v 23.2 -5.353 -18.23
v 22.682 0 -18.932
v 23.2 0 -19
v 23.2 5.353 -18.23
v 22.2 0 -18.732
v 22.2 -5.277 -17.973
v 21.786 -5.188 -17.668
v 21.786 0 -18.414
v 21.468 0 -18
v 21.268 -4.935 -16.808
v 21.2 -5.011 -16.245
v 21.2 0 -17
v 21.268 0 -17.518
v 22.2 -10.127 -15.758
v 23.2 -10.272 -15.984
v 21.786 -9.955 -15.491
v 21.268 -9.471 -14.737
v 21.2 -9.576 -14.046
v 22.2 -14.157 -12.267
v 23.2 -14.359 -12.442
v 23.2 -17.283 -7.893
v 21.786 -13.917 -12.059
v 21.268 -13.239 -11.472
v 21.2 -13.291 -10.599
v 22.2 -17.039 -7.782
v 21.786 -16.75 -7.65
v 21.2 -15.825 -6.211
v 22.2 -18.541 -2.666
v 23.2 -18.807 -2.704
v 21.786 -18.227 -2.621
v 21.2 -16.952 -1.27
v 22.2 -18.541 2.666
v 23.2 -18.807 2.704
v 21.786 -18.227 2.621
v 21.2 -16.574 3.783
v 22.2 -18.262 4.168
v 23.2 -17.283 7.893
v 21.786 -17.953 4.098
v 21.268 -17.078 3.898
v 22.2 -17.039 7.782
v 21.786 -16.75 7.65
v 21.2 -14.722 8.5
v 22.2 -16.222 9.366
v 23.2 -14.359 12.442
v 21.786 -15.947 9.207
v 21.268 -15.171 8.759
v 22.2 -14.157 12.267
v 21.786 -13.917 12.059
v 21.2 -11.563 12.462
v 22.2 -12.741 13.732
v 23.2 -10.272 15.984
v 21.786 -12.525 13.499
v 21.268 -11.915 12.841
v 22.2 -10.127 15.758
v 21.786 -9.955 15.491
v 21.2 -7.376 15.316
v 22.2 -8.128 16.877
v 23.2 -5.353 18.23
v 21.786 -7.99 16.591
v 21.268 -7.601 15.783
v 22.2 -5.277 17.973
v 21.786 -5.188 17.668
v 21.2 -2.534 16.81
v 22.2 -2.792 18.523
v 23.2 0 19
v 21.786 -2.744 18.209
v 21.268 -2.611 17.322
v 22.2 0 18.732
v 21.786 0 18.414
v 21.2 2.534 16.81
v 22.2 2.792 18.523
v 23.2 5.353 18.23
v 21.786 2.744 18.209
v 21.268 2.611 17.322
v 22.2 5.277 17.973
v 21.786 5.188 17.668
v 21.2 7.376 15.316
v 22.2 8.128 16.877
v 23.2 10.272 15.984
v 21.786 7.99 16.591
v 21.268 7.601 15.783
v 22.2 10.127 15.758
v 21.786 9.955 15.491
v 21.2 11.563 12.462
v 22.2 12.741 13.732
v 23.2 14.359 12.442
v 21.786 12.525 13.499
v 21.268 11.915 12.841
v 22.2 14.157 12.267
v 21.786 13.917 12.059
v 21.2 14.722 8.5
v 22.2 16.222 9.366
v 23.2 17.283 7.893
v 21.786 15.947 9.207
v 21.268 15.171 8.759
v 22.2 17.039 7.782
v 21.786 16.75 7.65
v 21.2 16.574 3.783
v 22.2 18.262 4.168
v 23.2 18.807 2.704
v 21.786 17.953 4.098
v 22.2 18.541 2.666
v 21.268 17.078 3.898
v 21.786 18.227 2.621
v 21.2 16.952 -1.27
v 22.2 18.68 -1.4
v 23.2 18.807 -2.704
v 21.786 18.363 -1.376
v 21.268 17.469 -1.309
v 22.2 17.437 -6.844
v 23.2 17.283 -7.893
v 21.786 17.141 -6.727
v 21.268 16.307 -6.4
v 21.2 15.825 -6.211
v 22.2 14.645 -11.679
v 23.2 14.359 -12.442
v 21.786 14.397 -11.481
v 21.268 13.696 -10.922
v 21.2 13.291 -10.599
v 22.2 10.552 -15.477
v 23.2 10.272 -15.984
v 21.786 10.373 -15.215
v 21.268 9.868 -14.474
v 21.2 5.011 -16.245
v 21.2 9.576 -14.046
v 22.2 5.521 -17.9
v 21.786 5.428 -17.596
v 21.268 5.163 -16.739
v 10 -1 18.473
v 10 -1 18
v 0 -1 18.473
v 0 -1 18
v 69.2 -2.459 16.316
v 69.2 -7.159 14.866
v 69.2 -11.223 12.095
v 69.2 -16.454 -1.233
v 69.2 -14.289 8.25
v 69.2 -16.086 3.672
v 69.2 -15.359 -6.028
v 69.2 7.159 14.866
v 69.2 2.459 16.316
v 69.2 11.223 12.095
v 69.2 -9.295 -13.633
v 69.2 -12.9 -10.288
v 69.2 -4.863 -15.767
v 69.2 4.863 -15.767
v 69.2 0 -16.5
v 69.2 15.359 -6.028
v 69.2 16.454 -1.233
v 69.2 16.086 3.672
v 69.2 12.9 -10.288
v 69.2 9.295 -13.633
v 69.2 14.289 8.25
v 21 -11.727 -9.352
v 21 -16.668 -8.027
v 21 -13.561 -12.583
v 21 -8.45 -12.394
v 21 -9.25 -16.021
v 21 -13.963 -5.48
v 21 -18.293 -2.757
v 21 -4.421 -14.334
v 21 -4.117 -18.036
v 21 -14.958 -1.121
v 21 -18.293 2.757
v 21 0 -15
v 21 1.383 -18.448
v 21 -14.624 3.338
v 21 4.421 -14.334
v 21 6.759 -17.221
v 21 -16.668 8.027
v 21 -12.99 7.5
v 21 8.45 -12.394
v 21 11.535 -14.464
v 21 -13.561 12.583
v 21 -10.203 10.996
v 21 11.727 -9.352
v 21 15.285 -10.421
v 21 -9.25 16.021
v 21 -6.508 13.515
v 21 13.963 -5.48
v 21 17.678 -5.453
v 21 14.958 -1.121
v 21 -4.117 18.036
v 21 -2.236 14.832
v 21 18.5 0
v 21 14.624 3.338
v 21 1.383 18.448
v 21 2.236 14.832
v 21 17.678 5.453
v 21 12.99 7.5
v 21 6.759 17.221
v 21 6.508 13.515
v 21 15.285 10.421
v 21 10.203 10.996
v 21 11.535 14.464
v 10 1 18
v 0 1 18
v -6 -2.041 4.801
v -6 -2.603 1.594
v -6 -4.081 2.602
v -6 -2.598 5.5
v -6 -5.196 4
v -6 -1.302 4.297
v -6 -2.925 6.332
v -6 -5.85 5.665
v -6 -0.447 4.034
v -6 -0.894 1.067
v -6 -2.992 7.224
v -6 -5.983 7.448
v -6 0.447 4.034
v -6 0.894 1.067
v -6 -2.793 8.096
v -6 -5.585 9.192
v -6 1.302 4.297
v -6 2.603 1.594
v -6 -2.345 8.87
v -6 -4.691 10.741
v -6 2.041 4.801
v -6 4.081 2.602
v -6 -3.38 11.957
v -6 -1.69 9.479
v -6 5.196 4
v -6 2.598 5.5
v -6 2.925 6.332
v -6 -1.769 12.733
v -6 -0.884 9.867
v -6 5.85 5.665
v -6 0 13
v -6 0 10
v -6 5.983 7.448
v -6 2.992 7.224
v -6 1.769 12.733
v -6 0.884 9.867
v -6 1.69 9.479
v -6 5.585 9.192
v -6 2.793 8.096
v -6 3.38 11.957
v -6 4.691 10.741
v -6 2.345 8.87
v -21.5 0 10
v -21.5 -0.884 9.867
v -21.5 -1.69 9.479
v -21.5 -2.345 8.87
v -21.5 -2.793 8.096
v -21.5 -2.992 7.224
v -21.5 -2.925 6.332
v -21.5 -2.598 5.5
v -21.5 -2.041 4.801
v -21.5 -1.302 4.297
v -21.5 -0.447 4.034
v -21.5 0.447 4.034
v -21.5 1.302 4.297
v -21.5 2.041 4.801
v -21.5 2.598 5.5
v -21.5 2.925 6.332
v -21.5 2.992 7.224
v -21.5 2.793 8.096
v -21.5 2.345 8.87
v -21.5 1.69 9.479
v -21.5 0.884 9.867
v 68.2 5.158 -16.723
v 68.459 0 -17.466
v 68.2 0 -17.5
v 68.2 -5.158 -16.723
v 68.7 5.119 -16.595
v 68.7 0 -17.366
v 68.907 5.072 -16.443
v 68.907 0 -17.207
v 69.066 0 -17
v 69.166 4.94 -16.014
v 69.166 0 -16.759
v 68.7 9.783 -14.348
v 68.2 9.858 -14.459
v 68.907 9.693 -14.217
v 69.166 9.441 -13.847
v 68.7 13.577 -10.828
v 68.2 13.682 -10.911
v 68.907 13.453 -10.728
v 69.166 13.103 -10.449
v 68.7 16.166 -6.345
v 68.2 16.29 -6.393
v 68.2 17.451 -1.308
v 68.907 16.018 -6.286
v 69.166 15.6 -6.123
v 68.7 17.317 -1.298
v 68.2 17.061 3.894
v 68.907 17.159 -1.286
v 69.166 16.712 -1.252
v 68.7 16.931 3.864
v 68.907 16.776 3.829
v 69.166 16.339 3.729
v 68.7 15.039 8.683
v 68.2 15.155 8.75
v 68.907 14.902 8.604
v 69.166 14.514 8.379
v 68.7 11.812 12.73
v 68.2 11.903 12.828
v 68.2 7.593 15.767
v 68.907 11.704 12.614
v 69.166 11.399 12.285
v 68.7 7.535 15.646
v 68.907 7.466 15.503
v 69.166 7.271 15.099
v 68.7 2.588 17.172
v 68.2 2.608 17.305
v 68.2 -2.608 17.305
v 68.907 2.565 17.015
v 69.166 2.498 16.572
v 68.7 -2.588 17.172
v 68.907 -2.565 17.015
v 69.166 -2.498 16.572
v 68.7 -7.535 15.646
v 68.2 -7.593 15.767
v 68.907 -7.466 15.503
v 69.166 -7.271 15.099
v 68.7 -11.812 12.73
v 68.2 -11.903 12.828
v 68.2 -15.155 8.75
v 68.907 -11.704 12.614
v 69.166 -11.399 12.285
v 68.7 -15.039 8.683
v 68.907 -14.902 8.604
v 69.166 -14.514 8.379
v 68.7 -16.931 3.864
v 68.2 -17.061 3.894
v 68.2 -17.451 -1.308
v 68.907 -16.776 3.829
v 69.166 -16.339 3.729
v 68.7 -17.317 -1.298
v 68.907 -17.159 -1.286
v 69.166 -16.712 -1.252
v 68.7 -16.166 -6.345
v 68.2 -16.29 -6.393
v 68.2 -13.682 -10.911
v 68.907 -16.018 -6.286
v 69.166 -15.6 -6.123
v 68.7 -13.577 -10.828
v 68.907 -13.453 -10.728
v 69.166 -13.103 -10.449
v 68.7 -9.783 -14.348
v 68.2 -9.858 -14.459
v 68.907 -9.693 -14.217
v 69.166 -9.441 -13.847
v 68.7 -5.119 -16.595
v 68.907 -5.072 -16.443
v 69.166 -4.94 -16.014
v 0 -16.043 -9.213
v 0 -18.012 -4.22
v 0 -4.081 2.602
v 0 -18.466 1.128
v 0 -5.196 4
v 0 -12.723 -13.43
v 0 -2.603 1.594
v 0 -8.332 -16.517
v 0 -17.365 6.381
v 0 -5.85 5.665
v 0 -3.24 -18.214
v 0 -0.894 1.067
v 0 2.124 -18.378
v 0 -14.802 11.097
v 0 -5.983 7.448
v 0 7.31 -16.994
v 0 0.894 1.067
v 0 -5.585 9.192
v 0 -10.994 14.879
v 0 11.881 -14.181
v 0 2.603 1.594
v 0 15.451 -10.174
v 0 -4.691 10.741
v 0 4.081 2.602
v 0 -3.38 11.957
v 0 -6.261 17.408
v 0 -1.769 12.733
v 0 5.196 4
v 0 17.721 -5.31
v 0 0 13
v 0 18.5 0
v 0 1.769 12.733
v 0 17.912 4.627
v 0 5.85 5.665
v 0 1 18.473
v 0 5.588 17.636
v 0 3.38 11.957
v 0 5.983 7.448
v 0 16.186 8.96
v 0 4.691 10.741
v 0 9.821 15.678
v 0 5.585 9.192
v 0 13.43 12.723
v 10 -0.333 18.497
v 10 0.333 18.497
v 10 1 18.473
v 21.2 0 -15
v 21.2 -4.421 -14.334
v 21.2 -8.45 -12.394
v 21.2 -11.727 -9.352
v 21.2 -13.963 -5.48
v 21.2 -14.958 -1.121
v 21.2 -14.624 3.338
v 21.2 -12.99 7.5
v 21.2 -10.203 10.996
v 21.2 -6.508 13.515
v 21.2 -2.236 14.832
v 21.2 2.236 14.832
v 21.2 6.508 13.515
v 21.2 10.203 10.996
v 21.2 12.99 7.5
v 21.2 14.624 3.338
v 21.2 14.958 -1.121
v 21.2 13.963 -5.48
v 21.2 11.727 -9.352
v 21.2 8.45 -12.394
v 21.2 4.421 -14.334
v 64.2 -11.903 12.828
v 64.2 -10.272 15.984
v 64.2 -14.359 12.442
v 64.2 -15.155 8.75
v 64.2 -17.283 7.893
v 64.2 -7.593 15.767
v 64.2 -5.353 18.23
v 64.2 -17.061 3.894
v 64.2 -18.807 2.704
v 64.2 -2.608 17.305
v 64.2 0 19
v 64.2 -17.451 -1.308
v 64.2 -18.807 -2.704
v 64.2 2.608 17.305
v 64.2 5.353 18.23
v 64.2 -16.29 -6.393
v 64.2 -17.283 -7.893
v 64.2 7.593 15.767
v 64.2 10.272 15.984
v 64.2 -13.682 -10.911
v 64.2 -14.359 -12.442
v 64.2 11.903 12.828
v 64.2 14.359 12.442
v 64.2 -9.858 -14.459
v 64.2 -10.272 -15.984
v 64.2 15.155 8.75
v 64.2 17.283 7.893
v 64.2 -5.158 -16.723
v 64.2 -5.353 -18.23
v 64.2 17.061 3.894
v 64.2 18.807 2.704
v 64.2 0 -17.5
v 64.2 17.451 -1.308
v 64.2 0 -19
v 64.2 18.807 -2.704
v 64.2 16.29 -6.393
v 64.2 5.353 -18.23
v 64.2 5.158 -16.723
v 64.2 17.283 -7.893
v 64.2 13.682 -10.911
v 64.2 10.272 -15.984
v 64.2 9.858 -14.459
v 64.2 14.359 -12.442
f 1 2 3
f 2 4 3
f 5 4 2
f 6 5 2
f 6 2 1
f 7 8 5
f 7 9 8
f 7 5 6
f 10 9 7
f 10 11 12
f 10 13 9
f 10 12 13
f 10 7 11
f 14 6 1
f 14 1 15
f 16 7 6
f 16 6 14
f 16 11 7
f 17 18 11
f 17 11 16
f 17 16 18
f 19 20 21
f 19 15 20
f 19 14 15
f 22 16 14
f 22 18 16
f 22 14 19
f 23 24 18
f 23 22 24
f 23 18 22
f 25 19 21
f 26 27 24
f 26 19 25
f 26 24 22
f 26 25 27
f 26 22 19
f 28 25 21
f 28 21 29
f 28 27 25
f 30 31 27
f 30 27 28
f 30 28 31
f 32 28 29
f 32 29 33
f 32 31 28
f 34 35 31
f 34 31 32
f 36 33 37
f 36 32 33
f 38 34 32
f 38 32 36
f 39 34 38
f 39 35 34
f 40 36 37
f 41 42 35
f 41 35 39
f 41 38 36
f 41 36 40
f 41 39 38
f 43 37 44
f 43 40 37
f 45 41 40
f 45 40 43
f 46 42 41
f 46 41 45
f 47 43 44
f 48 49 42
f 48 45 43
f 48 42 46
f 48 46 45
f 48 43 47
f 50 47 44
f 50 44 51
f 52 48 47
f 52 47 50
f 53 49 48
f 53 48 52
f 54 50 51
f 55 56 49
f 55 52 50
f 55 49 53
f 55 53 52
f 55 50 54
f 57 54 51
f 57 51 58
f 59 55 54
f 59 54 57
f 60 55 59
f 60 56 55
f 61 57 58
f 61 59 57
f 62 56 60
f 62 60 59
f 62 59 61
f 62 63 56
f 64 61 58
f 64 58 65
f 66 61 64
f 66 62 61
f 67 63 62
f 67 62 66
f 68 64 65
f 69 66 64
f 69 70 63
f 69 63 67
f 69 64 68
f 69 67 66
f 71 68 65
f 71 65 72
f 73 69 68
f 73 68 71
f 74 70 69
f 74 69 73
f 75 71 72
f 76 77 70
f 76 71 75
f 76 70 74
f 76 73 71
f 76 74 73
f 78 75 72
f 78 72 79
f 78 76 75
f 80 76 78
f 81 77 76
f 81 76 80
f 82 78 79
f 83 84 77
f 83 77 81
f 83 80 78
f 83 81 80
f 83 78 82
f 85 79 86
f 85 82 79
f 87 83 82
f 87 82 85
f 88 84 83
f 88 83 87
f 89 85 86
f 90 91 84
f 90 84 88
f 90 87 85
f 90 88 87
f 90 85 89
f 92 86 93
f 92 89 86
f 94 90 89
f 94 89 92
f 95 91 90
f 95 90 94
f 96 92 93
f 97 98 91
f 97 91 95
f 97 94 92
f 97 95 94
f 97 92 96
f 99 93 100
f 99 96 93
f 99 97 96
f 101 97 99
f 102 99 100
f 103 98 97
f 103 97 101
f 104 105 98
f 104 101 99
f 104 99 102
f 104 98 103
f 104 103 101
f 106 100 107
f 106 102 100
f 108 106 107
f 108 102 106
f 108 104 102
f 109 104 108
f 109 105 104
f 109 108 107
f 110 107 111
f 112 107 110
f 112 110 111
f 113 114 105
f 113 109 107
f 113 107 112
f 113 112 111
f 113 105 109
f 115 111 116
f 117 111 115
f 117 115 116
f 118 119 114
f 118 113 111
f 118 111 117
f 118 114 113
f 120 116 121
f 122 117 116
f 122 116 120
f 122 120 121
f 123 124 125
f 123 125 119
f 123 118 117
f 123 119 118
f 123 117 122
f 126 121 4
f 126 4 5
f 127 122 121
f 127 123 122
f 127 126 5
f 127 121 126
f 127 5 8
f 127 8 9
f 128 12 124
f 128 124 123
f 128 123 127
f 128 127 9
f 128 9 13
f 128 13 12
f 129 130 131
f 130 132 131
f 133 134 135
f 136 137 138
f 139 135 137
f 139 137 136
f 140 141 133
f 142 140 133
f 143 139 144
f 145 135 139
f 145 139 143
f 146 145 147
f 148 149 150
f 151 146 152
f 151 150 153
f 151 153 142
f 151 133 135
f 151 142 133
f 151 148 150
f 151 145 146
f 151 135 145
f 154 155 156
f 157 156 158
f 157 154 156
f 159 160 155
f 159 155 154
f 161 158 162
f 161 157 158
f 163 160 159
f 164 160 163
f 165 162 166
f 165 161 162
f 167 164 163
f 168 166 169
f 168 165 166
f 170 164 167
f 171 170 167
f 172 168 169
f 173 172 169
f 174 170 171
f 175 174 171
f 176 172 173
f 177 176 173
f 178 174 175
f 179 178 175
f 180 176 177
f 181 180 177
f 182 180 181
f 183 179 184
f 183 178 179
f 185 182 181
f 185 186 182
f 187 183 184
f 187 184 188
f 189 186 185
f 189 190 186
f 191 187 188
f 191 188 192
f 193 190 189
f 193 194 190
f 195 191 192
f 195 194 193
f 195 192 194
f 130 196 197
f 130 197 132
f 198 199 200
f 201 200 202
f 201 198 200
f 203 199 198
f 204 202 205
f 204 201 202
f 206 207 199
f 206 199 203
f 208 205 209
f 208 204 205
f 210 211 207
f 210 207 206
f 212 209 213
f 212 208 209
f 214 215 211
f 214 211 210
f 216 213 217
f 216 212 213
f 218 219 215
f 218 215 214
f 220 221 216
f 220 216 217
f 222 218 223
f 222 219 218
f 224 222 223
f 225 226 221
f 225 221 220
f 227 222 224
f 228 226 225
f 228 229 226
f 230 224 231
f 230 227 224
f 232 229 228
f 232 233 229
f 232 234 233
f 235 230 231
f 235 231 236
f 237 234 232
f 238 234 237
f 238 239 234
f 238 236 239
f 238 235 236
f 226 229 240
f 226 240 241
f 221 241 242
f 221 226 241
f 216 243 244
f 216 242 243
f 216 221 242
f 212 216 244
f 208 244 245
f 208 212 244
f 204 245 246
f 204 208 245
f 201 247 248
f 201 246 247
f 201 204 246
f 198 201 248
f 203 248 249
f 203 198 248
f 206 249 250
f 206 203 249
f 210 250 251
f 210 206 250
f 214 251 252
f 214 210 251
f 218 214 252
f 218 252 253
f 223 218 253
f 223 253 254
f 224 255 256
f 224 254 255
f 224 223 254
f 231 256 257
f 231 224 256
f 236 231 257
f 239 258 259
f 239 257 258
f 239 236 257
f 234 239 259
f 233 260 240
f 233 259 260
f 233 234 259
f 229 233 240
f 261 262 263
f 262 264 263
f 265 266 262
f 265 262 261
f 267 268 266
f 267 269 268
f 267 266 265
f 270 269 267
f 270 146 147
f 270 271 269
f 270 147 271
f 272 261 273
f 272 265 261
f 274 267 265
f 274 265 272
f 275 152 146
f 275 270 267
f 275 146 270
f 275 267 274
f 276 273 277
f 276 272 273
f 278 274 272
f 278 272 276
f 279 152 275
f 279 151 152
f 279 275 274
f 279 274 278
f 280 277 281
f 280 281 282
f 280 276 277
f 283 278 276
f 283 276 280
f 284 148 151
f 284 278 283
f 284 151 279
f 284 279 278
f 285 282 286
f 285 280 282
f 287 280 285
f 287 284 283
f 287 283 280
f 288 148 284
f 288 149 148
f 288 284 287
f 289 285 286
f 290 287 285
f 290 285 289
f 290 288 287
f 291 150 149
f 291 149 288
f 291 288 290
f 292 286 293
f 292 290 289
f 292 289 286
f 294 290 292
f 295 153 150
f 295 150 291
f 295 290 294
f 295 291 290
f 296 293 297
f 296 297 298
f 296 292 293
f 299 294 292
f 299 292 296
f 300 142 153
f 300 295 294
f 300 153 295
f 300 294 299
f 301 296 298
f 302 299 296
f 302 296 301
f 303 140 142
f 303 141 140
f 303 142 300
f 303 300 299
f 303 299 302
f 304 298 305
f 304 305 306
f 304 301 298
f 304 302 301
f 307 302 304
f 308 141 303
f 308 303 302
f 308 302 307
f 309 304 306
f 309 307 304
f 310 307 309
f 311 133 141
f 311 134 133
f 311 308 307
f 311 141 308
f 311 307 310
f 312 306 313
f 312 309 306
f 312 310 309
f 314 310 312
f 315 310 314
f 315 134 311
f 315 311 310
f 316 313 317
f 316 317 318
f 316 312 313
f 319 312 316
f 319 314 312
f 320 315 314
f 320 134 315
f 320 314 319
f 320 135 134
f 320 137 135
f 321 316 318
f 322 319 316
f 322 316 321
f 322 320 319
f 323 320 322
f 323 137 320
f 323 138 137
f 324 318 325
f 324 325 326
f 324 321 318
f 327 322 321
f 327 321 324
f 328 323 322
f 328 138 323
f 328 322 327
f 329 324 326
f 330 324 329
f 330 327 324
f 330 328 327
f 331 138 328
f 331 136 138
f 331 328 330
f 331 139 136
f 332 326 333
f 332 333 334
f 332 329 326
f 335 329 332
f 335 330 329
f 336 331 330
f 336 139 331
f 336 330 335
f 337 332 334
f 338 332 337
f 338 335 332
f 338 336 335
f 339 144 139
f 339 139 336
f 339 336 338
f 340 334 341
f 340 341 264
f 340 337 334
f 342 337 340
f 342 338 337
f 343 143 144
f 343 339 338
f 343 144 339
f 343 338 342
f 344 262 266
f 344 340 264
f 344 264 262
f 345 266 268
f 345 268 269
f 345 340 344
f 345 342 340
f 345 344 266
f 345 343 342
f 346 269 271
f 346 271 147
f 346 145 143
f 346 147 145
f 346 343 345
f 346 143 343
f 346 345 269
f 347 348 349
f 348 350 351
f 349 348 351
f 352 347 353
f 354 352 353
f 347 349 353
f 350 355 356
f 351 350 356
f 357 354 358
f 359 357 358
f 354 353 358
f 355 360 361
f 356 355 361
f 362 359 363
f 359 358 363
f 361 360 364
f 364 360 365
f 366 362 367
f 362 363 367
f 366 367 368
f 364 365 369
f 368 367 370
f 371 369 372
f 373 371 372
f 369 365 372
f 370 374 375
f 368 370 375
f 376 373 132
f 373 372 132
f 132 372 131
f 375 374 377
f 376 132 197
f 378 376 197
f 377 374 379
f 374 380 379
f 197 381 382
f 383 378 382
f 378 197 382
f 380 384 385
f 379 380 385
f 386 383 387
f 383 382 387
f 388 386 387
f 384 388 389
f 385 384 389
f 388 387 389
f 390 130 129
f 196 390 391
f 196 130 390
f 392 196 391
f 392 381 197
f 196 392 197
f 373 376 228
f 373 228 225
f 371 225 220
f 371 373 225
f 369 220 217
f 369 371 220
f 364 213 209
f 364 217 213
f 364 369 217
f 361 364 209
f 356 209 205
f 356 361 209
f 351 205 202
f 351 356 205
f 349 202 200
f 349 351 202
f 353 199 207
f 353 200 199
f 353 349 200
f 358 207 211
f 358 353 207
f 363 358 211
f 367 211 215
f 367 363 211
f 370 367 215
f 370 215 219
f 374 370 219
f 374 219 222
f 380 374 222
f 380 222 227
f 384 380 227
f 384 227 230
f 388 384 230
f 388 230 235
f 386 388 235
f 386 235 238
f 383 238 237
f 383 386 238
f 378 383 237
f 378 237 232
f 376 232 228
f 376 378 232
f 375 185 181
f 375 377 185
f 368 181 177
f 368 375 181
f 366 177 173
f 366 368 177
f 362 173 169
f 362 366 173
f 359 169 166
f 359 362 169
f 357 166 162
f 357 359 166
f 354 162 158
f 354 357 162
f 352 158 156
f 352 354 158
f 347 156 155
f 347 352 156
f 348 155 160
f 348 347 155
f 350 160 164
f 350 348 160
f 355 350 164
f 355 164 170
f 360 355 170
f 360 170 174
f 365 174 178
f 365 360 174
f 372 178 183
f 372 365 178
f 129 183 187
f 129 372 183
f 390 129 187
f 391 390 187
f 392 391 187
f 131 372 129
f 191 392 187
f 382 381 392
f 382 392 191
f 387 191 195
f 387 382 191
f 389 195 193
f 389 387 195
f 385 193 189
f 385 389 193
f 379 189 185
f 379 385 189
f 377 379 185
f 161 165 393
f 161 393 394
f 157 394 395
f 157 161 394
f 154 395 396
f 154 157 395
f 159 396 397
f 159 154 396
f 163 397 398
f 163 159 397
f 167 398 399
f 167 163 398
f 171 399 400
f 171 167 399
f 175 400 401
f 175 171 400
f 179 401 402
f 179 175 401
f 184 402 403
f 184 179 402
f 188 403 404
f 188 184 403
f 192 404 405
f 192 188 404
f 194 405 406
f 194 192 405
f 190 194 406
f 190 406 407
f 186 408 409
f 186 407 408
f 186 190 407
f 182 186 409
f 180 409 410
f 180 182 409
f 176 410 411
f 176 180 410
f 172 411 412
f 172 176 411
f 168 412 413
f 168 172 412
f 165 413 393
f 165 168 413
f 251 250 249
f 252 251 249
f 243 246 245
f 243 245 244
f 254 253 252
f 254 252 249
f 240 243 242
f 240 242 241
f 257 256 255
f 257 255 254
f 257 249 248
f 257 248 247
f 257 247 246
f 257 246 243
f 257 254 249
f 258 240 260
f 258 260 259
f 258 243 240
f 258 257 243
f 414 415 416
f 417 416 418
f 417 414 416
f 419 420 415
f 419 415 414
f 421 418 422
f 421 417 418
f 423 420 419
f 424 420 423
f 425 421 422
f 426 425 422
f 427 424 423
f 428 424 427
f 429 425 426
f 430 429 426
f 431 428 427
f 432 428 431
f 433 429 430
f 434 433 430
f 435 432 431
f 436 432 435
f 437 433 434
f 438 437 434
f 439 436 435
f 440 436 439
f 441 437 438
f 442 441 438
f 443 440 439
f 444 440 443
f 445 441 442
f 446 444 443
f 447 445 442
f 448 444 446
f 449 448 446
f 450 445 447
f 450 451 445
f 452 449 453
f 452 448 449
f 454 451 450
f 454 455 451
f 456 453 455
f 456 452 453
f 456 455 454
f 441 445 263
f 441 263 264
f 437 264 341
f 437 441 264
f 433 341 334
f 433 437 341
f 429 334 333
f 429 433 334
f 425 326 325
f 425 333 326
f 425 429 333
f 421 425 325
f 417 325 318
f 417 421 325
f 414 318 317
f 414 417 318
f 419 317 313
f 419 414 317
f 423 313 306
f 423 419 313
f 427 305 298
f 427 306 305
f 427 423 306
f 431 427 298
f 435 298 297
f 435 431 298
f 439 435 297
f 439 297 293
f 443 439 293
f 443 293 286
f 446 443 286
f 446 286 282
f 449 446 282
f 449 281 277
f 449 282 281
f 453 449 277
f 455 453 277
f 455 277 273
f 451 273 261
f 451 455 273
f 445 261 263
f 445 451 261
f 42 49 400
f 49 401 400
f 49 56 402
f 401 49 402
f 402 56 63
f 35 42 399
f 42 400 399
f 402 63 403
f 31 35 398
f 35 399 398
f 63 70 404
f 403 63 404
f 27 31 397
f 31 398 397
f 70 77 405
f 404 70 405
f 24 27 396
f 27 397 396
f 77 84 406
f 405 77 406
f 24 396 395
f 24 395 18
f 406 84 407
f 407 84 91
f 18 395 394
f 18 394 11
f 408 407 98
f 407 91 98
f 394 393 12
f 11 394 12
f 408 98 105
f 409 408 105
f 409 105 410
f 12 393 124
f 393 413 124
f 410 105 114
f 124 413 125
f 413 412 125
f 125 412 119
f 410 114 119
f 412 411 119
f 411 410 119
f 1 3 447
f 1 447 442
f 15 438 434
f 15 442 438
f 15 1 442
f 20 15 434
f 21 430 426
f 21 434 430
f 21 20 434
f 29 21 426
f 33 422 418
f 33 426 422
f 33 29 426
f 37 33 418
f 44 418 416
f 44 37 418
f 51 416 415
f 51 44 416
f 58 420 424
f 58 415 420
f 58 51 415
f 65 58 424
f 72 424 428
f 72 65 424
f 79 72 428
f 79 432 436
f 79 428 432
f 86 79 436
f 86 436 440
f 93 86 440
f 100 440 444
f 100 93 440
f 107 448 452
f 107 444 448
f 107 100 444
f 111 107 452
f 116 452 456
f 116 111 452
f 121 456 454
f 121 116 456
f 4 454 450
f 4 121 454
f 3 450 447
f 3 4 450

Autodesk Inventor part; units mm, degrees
ref_plane "YZ Plane" through (0, 0, 0) normal (1, 0, 0) x (0, 1, 0)
ref_plane "XZ Plane" through (0, 0, 0) normal (0, 1, 0) x (-1, 0, 0)
ref_plane "XY Plane" through (0, 0, 0) normal (0, 0, 1) x (1, 0, 0)
sketch "Эскиз1" plane through (0, 0, 0) normal (1, 0, 0) x (0, 1, 0)
  circle A0 centre (0, 0) radius 18.5
  dimension "d0" = 37
extrude "Выдавливание1" add sketch "Эскиз1" along normal blind 21
sketch "Эскиз2" plane through (21, 0, 0) normal (1, 0, 0) x (0, 0, -1)
  circle A0 centre (0, 0) radius 15
  dimension "d3" = 30
extrude "Выдавливание2" add sketch "Эскиз2" along normal blind 0.2
sketch "Эскиз3" plane through (21.2, 0, 0) normal (1, 0, 0) x (0, 0, -1)
  circle A0 centre (0, 0) radius 19
  dimension "d6" = 38
extrude "Выдавливание3" add sketch "Эскиз3" along normal blind 43
fillet "Сопряжение1" radius 2 1 edges at (21.2, 0, 19)
sketch "Эскиз4" plane through (64.2, 0, 0) normal (1, 0, 0) x (0, 0, -1)
  circle A0 centre (0, 0) radius 17.5
  dimension "d10" = 35
extrude "Выдавливание4" add sketch "Эскиз4" along normal blind 5
fillet "Сопряжение2" radius 1 1 edges at (69.2, 0, 17.5)
sketch "Эскиз5" plane through (0, 0, 0) normal (-1, 0, 0) x (0, 0, 1)
  line L0 (0, 0) -> (27.1698, 0) construction
  circle A0 centre (7, 0) radius 6
  dimension "d14" = 12
  dimension "d15" = 7
extrude "Выдавливание5" add sketch "Эскиз5" along normal blind 6
sketch "Эскиз6" plane through (-6, 0, 7) normal (-1, 0, 0) x (0, 0, 1)
  circle A0 centre (0, 0) radius 3
  circle A1 centre (0, 0) radius 6 projected
  point P0 (-7, 0)
  dimension "d18" = 6
extrude "Выдавливание6" add sketch "Эскиз6" along normal blind 15.5 contours A0
sketch "Эскиз7" plane through (0, 0, 0) normal (-1, 0, 0) x (0, 0, 1)
  circle A0 centre (7, 0) radius 3 projected
  line L0 (0, 0) -> (22.9048, 0) construction
  line L1 (21, 1) -> (18, 1)
  line L2 (18, 1) -> (18, -1)
  line L3 (18, -1) -> (21, -1)
  line L4 (21, -1) -> (21, 1)
  dimension "d21" = 18
  dimension "d22" = 3
  dimension "d23" = 2
extrude "Выдавливание7" cut sketch "Эскиз7" against normal blind 10 contours L4 L3 L2 L1
properties part number "Двигатель"
